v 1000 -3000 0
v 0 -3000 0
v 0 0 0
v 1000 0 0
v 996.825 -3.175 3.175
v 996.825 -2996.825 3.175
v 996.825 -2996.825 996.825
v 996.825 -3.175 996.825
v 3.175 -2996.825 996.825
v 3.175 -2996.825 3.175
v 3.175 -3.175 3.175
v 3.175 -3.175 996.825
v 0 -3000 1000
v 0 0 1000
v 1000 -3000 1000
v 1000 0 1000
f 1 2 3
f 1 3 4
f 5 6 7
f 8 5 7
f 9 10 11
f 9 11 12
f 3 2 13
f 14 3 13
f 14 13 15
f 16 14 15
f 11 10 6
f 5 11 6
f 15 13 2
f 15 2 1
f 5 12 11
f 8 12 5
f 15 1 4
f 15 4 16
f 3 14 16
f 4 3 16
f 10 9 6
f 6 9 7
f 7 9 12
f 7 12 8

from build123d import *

# Parameters (mm, degrees)
F0_W     = 1000
F0_H     = 1000
F1_DEPTH = 1500
F2_T     = -3.175


with BuildPart() as f1:
    # F0 (on Front) → F1 (new body)
    with BuildSketch(Plane.XZ):
        with Locations((500, 500)):
            Rectangle(F0_W, F0_H)
    extrude(amount=F1_DEPTH)

    # F2
    f2_openings = [f1.faces().sort_by_distance(p)[0] for p in [
        (500, -1500, 500),
    ]]
    offset(amount=F2_T, openings=f2_openings)

    # F4: F1 across plane


with BuildPart() as f1_1:
    add(f1.part)
    add(f1.part.mirror(Plane.XZ.offset(1500)))


solid = f1_1.part
